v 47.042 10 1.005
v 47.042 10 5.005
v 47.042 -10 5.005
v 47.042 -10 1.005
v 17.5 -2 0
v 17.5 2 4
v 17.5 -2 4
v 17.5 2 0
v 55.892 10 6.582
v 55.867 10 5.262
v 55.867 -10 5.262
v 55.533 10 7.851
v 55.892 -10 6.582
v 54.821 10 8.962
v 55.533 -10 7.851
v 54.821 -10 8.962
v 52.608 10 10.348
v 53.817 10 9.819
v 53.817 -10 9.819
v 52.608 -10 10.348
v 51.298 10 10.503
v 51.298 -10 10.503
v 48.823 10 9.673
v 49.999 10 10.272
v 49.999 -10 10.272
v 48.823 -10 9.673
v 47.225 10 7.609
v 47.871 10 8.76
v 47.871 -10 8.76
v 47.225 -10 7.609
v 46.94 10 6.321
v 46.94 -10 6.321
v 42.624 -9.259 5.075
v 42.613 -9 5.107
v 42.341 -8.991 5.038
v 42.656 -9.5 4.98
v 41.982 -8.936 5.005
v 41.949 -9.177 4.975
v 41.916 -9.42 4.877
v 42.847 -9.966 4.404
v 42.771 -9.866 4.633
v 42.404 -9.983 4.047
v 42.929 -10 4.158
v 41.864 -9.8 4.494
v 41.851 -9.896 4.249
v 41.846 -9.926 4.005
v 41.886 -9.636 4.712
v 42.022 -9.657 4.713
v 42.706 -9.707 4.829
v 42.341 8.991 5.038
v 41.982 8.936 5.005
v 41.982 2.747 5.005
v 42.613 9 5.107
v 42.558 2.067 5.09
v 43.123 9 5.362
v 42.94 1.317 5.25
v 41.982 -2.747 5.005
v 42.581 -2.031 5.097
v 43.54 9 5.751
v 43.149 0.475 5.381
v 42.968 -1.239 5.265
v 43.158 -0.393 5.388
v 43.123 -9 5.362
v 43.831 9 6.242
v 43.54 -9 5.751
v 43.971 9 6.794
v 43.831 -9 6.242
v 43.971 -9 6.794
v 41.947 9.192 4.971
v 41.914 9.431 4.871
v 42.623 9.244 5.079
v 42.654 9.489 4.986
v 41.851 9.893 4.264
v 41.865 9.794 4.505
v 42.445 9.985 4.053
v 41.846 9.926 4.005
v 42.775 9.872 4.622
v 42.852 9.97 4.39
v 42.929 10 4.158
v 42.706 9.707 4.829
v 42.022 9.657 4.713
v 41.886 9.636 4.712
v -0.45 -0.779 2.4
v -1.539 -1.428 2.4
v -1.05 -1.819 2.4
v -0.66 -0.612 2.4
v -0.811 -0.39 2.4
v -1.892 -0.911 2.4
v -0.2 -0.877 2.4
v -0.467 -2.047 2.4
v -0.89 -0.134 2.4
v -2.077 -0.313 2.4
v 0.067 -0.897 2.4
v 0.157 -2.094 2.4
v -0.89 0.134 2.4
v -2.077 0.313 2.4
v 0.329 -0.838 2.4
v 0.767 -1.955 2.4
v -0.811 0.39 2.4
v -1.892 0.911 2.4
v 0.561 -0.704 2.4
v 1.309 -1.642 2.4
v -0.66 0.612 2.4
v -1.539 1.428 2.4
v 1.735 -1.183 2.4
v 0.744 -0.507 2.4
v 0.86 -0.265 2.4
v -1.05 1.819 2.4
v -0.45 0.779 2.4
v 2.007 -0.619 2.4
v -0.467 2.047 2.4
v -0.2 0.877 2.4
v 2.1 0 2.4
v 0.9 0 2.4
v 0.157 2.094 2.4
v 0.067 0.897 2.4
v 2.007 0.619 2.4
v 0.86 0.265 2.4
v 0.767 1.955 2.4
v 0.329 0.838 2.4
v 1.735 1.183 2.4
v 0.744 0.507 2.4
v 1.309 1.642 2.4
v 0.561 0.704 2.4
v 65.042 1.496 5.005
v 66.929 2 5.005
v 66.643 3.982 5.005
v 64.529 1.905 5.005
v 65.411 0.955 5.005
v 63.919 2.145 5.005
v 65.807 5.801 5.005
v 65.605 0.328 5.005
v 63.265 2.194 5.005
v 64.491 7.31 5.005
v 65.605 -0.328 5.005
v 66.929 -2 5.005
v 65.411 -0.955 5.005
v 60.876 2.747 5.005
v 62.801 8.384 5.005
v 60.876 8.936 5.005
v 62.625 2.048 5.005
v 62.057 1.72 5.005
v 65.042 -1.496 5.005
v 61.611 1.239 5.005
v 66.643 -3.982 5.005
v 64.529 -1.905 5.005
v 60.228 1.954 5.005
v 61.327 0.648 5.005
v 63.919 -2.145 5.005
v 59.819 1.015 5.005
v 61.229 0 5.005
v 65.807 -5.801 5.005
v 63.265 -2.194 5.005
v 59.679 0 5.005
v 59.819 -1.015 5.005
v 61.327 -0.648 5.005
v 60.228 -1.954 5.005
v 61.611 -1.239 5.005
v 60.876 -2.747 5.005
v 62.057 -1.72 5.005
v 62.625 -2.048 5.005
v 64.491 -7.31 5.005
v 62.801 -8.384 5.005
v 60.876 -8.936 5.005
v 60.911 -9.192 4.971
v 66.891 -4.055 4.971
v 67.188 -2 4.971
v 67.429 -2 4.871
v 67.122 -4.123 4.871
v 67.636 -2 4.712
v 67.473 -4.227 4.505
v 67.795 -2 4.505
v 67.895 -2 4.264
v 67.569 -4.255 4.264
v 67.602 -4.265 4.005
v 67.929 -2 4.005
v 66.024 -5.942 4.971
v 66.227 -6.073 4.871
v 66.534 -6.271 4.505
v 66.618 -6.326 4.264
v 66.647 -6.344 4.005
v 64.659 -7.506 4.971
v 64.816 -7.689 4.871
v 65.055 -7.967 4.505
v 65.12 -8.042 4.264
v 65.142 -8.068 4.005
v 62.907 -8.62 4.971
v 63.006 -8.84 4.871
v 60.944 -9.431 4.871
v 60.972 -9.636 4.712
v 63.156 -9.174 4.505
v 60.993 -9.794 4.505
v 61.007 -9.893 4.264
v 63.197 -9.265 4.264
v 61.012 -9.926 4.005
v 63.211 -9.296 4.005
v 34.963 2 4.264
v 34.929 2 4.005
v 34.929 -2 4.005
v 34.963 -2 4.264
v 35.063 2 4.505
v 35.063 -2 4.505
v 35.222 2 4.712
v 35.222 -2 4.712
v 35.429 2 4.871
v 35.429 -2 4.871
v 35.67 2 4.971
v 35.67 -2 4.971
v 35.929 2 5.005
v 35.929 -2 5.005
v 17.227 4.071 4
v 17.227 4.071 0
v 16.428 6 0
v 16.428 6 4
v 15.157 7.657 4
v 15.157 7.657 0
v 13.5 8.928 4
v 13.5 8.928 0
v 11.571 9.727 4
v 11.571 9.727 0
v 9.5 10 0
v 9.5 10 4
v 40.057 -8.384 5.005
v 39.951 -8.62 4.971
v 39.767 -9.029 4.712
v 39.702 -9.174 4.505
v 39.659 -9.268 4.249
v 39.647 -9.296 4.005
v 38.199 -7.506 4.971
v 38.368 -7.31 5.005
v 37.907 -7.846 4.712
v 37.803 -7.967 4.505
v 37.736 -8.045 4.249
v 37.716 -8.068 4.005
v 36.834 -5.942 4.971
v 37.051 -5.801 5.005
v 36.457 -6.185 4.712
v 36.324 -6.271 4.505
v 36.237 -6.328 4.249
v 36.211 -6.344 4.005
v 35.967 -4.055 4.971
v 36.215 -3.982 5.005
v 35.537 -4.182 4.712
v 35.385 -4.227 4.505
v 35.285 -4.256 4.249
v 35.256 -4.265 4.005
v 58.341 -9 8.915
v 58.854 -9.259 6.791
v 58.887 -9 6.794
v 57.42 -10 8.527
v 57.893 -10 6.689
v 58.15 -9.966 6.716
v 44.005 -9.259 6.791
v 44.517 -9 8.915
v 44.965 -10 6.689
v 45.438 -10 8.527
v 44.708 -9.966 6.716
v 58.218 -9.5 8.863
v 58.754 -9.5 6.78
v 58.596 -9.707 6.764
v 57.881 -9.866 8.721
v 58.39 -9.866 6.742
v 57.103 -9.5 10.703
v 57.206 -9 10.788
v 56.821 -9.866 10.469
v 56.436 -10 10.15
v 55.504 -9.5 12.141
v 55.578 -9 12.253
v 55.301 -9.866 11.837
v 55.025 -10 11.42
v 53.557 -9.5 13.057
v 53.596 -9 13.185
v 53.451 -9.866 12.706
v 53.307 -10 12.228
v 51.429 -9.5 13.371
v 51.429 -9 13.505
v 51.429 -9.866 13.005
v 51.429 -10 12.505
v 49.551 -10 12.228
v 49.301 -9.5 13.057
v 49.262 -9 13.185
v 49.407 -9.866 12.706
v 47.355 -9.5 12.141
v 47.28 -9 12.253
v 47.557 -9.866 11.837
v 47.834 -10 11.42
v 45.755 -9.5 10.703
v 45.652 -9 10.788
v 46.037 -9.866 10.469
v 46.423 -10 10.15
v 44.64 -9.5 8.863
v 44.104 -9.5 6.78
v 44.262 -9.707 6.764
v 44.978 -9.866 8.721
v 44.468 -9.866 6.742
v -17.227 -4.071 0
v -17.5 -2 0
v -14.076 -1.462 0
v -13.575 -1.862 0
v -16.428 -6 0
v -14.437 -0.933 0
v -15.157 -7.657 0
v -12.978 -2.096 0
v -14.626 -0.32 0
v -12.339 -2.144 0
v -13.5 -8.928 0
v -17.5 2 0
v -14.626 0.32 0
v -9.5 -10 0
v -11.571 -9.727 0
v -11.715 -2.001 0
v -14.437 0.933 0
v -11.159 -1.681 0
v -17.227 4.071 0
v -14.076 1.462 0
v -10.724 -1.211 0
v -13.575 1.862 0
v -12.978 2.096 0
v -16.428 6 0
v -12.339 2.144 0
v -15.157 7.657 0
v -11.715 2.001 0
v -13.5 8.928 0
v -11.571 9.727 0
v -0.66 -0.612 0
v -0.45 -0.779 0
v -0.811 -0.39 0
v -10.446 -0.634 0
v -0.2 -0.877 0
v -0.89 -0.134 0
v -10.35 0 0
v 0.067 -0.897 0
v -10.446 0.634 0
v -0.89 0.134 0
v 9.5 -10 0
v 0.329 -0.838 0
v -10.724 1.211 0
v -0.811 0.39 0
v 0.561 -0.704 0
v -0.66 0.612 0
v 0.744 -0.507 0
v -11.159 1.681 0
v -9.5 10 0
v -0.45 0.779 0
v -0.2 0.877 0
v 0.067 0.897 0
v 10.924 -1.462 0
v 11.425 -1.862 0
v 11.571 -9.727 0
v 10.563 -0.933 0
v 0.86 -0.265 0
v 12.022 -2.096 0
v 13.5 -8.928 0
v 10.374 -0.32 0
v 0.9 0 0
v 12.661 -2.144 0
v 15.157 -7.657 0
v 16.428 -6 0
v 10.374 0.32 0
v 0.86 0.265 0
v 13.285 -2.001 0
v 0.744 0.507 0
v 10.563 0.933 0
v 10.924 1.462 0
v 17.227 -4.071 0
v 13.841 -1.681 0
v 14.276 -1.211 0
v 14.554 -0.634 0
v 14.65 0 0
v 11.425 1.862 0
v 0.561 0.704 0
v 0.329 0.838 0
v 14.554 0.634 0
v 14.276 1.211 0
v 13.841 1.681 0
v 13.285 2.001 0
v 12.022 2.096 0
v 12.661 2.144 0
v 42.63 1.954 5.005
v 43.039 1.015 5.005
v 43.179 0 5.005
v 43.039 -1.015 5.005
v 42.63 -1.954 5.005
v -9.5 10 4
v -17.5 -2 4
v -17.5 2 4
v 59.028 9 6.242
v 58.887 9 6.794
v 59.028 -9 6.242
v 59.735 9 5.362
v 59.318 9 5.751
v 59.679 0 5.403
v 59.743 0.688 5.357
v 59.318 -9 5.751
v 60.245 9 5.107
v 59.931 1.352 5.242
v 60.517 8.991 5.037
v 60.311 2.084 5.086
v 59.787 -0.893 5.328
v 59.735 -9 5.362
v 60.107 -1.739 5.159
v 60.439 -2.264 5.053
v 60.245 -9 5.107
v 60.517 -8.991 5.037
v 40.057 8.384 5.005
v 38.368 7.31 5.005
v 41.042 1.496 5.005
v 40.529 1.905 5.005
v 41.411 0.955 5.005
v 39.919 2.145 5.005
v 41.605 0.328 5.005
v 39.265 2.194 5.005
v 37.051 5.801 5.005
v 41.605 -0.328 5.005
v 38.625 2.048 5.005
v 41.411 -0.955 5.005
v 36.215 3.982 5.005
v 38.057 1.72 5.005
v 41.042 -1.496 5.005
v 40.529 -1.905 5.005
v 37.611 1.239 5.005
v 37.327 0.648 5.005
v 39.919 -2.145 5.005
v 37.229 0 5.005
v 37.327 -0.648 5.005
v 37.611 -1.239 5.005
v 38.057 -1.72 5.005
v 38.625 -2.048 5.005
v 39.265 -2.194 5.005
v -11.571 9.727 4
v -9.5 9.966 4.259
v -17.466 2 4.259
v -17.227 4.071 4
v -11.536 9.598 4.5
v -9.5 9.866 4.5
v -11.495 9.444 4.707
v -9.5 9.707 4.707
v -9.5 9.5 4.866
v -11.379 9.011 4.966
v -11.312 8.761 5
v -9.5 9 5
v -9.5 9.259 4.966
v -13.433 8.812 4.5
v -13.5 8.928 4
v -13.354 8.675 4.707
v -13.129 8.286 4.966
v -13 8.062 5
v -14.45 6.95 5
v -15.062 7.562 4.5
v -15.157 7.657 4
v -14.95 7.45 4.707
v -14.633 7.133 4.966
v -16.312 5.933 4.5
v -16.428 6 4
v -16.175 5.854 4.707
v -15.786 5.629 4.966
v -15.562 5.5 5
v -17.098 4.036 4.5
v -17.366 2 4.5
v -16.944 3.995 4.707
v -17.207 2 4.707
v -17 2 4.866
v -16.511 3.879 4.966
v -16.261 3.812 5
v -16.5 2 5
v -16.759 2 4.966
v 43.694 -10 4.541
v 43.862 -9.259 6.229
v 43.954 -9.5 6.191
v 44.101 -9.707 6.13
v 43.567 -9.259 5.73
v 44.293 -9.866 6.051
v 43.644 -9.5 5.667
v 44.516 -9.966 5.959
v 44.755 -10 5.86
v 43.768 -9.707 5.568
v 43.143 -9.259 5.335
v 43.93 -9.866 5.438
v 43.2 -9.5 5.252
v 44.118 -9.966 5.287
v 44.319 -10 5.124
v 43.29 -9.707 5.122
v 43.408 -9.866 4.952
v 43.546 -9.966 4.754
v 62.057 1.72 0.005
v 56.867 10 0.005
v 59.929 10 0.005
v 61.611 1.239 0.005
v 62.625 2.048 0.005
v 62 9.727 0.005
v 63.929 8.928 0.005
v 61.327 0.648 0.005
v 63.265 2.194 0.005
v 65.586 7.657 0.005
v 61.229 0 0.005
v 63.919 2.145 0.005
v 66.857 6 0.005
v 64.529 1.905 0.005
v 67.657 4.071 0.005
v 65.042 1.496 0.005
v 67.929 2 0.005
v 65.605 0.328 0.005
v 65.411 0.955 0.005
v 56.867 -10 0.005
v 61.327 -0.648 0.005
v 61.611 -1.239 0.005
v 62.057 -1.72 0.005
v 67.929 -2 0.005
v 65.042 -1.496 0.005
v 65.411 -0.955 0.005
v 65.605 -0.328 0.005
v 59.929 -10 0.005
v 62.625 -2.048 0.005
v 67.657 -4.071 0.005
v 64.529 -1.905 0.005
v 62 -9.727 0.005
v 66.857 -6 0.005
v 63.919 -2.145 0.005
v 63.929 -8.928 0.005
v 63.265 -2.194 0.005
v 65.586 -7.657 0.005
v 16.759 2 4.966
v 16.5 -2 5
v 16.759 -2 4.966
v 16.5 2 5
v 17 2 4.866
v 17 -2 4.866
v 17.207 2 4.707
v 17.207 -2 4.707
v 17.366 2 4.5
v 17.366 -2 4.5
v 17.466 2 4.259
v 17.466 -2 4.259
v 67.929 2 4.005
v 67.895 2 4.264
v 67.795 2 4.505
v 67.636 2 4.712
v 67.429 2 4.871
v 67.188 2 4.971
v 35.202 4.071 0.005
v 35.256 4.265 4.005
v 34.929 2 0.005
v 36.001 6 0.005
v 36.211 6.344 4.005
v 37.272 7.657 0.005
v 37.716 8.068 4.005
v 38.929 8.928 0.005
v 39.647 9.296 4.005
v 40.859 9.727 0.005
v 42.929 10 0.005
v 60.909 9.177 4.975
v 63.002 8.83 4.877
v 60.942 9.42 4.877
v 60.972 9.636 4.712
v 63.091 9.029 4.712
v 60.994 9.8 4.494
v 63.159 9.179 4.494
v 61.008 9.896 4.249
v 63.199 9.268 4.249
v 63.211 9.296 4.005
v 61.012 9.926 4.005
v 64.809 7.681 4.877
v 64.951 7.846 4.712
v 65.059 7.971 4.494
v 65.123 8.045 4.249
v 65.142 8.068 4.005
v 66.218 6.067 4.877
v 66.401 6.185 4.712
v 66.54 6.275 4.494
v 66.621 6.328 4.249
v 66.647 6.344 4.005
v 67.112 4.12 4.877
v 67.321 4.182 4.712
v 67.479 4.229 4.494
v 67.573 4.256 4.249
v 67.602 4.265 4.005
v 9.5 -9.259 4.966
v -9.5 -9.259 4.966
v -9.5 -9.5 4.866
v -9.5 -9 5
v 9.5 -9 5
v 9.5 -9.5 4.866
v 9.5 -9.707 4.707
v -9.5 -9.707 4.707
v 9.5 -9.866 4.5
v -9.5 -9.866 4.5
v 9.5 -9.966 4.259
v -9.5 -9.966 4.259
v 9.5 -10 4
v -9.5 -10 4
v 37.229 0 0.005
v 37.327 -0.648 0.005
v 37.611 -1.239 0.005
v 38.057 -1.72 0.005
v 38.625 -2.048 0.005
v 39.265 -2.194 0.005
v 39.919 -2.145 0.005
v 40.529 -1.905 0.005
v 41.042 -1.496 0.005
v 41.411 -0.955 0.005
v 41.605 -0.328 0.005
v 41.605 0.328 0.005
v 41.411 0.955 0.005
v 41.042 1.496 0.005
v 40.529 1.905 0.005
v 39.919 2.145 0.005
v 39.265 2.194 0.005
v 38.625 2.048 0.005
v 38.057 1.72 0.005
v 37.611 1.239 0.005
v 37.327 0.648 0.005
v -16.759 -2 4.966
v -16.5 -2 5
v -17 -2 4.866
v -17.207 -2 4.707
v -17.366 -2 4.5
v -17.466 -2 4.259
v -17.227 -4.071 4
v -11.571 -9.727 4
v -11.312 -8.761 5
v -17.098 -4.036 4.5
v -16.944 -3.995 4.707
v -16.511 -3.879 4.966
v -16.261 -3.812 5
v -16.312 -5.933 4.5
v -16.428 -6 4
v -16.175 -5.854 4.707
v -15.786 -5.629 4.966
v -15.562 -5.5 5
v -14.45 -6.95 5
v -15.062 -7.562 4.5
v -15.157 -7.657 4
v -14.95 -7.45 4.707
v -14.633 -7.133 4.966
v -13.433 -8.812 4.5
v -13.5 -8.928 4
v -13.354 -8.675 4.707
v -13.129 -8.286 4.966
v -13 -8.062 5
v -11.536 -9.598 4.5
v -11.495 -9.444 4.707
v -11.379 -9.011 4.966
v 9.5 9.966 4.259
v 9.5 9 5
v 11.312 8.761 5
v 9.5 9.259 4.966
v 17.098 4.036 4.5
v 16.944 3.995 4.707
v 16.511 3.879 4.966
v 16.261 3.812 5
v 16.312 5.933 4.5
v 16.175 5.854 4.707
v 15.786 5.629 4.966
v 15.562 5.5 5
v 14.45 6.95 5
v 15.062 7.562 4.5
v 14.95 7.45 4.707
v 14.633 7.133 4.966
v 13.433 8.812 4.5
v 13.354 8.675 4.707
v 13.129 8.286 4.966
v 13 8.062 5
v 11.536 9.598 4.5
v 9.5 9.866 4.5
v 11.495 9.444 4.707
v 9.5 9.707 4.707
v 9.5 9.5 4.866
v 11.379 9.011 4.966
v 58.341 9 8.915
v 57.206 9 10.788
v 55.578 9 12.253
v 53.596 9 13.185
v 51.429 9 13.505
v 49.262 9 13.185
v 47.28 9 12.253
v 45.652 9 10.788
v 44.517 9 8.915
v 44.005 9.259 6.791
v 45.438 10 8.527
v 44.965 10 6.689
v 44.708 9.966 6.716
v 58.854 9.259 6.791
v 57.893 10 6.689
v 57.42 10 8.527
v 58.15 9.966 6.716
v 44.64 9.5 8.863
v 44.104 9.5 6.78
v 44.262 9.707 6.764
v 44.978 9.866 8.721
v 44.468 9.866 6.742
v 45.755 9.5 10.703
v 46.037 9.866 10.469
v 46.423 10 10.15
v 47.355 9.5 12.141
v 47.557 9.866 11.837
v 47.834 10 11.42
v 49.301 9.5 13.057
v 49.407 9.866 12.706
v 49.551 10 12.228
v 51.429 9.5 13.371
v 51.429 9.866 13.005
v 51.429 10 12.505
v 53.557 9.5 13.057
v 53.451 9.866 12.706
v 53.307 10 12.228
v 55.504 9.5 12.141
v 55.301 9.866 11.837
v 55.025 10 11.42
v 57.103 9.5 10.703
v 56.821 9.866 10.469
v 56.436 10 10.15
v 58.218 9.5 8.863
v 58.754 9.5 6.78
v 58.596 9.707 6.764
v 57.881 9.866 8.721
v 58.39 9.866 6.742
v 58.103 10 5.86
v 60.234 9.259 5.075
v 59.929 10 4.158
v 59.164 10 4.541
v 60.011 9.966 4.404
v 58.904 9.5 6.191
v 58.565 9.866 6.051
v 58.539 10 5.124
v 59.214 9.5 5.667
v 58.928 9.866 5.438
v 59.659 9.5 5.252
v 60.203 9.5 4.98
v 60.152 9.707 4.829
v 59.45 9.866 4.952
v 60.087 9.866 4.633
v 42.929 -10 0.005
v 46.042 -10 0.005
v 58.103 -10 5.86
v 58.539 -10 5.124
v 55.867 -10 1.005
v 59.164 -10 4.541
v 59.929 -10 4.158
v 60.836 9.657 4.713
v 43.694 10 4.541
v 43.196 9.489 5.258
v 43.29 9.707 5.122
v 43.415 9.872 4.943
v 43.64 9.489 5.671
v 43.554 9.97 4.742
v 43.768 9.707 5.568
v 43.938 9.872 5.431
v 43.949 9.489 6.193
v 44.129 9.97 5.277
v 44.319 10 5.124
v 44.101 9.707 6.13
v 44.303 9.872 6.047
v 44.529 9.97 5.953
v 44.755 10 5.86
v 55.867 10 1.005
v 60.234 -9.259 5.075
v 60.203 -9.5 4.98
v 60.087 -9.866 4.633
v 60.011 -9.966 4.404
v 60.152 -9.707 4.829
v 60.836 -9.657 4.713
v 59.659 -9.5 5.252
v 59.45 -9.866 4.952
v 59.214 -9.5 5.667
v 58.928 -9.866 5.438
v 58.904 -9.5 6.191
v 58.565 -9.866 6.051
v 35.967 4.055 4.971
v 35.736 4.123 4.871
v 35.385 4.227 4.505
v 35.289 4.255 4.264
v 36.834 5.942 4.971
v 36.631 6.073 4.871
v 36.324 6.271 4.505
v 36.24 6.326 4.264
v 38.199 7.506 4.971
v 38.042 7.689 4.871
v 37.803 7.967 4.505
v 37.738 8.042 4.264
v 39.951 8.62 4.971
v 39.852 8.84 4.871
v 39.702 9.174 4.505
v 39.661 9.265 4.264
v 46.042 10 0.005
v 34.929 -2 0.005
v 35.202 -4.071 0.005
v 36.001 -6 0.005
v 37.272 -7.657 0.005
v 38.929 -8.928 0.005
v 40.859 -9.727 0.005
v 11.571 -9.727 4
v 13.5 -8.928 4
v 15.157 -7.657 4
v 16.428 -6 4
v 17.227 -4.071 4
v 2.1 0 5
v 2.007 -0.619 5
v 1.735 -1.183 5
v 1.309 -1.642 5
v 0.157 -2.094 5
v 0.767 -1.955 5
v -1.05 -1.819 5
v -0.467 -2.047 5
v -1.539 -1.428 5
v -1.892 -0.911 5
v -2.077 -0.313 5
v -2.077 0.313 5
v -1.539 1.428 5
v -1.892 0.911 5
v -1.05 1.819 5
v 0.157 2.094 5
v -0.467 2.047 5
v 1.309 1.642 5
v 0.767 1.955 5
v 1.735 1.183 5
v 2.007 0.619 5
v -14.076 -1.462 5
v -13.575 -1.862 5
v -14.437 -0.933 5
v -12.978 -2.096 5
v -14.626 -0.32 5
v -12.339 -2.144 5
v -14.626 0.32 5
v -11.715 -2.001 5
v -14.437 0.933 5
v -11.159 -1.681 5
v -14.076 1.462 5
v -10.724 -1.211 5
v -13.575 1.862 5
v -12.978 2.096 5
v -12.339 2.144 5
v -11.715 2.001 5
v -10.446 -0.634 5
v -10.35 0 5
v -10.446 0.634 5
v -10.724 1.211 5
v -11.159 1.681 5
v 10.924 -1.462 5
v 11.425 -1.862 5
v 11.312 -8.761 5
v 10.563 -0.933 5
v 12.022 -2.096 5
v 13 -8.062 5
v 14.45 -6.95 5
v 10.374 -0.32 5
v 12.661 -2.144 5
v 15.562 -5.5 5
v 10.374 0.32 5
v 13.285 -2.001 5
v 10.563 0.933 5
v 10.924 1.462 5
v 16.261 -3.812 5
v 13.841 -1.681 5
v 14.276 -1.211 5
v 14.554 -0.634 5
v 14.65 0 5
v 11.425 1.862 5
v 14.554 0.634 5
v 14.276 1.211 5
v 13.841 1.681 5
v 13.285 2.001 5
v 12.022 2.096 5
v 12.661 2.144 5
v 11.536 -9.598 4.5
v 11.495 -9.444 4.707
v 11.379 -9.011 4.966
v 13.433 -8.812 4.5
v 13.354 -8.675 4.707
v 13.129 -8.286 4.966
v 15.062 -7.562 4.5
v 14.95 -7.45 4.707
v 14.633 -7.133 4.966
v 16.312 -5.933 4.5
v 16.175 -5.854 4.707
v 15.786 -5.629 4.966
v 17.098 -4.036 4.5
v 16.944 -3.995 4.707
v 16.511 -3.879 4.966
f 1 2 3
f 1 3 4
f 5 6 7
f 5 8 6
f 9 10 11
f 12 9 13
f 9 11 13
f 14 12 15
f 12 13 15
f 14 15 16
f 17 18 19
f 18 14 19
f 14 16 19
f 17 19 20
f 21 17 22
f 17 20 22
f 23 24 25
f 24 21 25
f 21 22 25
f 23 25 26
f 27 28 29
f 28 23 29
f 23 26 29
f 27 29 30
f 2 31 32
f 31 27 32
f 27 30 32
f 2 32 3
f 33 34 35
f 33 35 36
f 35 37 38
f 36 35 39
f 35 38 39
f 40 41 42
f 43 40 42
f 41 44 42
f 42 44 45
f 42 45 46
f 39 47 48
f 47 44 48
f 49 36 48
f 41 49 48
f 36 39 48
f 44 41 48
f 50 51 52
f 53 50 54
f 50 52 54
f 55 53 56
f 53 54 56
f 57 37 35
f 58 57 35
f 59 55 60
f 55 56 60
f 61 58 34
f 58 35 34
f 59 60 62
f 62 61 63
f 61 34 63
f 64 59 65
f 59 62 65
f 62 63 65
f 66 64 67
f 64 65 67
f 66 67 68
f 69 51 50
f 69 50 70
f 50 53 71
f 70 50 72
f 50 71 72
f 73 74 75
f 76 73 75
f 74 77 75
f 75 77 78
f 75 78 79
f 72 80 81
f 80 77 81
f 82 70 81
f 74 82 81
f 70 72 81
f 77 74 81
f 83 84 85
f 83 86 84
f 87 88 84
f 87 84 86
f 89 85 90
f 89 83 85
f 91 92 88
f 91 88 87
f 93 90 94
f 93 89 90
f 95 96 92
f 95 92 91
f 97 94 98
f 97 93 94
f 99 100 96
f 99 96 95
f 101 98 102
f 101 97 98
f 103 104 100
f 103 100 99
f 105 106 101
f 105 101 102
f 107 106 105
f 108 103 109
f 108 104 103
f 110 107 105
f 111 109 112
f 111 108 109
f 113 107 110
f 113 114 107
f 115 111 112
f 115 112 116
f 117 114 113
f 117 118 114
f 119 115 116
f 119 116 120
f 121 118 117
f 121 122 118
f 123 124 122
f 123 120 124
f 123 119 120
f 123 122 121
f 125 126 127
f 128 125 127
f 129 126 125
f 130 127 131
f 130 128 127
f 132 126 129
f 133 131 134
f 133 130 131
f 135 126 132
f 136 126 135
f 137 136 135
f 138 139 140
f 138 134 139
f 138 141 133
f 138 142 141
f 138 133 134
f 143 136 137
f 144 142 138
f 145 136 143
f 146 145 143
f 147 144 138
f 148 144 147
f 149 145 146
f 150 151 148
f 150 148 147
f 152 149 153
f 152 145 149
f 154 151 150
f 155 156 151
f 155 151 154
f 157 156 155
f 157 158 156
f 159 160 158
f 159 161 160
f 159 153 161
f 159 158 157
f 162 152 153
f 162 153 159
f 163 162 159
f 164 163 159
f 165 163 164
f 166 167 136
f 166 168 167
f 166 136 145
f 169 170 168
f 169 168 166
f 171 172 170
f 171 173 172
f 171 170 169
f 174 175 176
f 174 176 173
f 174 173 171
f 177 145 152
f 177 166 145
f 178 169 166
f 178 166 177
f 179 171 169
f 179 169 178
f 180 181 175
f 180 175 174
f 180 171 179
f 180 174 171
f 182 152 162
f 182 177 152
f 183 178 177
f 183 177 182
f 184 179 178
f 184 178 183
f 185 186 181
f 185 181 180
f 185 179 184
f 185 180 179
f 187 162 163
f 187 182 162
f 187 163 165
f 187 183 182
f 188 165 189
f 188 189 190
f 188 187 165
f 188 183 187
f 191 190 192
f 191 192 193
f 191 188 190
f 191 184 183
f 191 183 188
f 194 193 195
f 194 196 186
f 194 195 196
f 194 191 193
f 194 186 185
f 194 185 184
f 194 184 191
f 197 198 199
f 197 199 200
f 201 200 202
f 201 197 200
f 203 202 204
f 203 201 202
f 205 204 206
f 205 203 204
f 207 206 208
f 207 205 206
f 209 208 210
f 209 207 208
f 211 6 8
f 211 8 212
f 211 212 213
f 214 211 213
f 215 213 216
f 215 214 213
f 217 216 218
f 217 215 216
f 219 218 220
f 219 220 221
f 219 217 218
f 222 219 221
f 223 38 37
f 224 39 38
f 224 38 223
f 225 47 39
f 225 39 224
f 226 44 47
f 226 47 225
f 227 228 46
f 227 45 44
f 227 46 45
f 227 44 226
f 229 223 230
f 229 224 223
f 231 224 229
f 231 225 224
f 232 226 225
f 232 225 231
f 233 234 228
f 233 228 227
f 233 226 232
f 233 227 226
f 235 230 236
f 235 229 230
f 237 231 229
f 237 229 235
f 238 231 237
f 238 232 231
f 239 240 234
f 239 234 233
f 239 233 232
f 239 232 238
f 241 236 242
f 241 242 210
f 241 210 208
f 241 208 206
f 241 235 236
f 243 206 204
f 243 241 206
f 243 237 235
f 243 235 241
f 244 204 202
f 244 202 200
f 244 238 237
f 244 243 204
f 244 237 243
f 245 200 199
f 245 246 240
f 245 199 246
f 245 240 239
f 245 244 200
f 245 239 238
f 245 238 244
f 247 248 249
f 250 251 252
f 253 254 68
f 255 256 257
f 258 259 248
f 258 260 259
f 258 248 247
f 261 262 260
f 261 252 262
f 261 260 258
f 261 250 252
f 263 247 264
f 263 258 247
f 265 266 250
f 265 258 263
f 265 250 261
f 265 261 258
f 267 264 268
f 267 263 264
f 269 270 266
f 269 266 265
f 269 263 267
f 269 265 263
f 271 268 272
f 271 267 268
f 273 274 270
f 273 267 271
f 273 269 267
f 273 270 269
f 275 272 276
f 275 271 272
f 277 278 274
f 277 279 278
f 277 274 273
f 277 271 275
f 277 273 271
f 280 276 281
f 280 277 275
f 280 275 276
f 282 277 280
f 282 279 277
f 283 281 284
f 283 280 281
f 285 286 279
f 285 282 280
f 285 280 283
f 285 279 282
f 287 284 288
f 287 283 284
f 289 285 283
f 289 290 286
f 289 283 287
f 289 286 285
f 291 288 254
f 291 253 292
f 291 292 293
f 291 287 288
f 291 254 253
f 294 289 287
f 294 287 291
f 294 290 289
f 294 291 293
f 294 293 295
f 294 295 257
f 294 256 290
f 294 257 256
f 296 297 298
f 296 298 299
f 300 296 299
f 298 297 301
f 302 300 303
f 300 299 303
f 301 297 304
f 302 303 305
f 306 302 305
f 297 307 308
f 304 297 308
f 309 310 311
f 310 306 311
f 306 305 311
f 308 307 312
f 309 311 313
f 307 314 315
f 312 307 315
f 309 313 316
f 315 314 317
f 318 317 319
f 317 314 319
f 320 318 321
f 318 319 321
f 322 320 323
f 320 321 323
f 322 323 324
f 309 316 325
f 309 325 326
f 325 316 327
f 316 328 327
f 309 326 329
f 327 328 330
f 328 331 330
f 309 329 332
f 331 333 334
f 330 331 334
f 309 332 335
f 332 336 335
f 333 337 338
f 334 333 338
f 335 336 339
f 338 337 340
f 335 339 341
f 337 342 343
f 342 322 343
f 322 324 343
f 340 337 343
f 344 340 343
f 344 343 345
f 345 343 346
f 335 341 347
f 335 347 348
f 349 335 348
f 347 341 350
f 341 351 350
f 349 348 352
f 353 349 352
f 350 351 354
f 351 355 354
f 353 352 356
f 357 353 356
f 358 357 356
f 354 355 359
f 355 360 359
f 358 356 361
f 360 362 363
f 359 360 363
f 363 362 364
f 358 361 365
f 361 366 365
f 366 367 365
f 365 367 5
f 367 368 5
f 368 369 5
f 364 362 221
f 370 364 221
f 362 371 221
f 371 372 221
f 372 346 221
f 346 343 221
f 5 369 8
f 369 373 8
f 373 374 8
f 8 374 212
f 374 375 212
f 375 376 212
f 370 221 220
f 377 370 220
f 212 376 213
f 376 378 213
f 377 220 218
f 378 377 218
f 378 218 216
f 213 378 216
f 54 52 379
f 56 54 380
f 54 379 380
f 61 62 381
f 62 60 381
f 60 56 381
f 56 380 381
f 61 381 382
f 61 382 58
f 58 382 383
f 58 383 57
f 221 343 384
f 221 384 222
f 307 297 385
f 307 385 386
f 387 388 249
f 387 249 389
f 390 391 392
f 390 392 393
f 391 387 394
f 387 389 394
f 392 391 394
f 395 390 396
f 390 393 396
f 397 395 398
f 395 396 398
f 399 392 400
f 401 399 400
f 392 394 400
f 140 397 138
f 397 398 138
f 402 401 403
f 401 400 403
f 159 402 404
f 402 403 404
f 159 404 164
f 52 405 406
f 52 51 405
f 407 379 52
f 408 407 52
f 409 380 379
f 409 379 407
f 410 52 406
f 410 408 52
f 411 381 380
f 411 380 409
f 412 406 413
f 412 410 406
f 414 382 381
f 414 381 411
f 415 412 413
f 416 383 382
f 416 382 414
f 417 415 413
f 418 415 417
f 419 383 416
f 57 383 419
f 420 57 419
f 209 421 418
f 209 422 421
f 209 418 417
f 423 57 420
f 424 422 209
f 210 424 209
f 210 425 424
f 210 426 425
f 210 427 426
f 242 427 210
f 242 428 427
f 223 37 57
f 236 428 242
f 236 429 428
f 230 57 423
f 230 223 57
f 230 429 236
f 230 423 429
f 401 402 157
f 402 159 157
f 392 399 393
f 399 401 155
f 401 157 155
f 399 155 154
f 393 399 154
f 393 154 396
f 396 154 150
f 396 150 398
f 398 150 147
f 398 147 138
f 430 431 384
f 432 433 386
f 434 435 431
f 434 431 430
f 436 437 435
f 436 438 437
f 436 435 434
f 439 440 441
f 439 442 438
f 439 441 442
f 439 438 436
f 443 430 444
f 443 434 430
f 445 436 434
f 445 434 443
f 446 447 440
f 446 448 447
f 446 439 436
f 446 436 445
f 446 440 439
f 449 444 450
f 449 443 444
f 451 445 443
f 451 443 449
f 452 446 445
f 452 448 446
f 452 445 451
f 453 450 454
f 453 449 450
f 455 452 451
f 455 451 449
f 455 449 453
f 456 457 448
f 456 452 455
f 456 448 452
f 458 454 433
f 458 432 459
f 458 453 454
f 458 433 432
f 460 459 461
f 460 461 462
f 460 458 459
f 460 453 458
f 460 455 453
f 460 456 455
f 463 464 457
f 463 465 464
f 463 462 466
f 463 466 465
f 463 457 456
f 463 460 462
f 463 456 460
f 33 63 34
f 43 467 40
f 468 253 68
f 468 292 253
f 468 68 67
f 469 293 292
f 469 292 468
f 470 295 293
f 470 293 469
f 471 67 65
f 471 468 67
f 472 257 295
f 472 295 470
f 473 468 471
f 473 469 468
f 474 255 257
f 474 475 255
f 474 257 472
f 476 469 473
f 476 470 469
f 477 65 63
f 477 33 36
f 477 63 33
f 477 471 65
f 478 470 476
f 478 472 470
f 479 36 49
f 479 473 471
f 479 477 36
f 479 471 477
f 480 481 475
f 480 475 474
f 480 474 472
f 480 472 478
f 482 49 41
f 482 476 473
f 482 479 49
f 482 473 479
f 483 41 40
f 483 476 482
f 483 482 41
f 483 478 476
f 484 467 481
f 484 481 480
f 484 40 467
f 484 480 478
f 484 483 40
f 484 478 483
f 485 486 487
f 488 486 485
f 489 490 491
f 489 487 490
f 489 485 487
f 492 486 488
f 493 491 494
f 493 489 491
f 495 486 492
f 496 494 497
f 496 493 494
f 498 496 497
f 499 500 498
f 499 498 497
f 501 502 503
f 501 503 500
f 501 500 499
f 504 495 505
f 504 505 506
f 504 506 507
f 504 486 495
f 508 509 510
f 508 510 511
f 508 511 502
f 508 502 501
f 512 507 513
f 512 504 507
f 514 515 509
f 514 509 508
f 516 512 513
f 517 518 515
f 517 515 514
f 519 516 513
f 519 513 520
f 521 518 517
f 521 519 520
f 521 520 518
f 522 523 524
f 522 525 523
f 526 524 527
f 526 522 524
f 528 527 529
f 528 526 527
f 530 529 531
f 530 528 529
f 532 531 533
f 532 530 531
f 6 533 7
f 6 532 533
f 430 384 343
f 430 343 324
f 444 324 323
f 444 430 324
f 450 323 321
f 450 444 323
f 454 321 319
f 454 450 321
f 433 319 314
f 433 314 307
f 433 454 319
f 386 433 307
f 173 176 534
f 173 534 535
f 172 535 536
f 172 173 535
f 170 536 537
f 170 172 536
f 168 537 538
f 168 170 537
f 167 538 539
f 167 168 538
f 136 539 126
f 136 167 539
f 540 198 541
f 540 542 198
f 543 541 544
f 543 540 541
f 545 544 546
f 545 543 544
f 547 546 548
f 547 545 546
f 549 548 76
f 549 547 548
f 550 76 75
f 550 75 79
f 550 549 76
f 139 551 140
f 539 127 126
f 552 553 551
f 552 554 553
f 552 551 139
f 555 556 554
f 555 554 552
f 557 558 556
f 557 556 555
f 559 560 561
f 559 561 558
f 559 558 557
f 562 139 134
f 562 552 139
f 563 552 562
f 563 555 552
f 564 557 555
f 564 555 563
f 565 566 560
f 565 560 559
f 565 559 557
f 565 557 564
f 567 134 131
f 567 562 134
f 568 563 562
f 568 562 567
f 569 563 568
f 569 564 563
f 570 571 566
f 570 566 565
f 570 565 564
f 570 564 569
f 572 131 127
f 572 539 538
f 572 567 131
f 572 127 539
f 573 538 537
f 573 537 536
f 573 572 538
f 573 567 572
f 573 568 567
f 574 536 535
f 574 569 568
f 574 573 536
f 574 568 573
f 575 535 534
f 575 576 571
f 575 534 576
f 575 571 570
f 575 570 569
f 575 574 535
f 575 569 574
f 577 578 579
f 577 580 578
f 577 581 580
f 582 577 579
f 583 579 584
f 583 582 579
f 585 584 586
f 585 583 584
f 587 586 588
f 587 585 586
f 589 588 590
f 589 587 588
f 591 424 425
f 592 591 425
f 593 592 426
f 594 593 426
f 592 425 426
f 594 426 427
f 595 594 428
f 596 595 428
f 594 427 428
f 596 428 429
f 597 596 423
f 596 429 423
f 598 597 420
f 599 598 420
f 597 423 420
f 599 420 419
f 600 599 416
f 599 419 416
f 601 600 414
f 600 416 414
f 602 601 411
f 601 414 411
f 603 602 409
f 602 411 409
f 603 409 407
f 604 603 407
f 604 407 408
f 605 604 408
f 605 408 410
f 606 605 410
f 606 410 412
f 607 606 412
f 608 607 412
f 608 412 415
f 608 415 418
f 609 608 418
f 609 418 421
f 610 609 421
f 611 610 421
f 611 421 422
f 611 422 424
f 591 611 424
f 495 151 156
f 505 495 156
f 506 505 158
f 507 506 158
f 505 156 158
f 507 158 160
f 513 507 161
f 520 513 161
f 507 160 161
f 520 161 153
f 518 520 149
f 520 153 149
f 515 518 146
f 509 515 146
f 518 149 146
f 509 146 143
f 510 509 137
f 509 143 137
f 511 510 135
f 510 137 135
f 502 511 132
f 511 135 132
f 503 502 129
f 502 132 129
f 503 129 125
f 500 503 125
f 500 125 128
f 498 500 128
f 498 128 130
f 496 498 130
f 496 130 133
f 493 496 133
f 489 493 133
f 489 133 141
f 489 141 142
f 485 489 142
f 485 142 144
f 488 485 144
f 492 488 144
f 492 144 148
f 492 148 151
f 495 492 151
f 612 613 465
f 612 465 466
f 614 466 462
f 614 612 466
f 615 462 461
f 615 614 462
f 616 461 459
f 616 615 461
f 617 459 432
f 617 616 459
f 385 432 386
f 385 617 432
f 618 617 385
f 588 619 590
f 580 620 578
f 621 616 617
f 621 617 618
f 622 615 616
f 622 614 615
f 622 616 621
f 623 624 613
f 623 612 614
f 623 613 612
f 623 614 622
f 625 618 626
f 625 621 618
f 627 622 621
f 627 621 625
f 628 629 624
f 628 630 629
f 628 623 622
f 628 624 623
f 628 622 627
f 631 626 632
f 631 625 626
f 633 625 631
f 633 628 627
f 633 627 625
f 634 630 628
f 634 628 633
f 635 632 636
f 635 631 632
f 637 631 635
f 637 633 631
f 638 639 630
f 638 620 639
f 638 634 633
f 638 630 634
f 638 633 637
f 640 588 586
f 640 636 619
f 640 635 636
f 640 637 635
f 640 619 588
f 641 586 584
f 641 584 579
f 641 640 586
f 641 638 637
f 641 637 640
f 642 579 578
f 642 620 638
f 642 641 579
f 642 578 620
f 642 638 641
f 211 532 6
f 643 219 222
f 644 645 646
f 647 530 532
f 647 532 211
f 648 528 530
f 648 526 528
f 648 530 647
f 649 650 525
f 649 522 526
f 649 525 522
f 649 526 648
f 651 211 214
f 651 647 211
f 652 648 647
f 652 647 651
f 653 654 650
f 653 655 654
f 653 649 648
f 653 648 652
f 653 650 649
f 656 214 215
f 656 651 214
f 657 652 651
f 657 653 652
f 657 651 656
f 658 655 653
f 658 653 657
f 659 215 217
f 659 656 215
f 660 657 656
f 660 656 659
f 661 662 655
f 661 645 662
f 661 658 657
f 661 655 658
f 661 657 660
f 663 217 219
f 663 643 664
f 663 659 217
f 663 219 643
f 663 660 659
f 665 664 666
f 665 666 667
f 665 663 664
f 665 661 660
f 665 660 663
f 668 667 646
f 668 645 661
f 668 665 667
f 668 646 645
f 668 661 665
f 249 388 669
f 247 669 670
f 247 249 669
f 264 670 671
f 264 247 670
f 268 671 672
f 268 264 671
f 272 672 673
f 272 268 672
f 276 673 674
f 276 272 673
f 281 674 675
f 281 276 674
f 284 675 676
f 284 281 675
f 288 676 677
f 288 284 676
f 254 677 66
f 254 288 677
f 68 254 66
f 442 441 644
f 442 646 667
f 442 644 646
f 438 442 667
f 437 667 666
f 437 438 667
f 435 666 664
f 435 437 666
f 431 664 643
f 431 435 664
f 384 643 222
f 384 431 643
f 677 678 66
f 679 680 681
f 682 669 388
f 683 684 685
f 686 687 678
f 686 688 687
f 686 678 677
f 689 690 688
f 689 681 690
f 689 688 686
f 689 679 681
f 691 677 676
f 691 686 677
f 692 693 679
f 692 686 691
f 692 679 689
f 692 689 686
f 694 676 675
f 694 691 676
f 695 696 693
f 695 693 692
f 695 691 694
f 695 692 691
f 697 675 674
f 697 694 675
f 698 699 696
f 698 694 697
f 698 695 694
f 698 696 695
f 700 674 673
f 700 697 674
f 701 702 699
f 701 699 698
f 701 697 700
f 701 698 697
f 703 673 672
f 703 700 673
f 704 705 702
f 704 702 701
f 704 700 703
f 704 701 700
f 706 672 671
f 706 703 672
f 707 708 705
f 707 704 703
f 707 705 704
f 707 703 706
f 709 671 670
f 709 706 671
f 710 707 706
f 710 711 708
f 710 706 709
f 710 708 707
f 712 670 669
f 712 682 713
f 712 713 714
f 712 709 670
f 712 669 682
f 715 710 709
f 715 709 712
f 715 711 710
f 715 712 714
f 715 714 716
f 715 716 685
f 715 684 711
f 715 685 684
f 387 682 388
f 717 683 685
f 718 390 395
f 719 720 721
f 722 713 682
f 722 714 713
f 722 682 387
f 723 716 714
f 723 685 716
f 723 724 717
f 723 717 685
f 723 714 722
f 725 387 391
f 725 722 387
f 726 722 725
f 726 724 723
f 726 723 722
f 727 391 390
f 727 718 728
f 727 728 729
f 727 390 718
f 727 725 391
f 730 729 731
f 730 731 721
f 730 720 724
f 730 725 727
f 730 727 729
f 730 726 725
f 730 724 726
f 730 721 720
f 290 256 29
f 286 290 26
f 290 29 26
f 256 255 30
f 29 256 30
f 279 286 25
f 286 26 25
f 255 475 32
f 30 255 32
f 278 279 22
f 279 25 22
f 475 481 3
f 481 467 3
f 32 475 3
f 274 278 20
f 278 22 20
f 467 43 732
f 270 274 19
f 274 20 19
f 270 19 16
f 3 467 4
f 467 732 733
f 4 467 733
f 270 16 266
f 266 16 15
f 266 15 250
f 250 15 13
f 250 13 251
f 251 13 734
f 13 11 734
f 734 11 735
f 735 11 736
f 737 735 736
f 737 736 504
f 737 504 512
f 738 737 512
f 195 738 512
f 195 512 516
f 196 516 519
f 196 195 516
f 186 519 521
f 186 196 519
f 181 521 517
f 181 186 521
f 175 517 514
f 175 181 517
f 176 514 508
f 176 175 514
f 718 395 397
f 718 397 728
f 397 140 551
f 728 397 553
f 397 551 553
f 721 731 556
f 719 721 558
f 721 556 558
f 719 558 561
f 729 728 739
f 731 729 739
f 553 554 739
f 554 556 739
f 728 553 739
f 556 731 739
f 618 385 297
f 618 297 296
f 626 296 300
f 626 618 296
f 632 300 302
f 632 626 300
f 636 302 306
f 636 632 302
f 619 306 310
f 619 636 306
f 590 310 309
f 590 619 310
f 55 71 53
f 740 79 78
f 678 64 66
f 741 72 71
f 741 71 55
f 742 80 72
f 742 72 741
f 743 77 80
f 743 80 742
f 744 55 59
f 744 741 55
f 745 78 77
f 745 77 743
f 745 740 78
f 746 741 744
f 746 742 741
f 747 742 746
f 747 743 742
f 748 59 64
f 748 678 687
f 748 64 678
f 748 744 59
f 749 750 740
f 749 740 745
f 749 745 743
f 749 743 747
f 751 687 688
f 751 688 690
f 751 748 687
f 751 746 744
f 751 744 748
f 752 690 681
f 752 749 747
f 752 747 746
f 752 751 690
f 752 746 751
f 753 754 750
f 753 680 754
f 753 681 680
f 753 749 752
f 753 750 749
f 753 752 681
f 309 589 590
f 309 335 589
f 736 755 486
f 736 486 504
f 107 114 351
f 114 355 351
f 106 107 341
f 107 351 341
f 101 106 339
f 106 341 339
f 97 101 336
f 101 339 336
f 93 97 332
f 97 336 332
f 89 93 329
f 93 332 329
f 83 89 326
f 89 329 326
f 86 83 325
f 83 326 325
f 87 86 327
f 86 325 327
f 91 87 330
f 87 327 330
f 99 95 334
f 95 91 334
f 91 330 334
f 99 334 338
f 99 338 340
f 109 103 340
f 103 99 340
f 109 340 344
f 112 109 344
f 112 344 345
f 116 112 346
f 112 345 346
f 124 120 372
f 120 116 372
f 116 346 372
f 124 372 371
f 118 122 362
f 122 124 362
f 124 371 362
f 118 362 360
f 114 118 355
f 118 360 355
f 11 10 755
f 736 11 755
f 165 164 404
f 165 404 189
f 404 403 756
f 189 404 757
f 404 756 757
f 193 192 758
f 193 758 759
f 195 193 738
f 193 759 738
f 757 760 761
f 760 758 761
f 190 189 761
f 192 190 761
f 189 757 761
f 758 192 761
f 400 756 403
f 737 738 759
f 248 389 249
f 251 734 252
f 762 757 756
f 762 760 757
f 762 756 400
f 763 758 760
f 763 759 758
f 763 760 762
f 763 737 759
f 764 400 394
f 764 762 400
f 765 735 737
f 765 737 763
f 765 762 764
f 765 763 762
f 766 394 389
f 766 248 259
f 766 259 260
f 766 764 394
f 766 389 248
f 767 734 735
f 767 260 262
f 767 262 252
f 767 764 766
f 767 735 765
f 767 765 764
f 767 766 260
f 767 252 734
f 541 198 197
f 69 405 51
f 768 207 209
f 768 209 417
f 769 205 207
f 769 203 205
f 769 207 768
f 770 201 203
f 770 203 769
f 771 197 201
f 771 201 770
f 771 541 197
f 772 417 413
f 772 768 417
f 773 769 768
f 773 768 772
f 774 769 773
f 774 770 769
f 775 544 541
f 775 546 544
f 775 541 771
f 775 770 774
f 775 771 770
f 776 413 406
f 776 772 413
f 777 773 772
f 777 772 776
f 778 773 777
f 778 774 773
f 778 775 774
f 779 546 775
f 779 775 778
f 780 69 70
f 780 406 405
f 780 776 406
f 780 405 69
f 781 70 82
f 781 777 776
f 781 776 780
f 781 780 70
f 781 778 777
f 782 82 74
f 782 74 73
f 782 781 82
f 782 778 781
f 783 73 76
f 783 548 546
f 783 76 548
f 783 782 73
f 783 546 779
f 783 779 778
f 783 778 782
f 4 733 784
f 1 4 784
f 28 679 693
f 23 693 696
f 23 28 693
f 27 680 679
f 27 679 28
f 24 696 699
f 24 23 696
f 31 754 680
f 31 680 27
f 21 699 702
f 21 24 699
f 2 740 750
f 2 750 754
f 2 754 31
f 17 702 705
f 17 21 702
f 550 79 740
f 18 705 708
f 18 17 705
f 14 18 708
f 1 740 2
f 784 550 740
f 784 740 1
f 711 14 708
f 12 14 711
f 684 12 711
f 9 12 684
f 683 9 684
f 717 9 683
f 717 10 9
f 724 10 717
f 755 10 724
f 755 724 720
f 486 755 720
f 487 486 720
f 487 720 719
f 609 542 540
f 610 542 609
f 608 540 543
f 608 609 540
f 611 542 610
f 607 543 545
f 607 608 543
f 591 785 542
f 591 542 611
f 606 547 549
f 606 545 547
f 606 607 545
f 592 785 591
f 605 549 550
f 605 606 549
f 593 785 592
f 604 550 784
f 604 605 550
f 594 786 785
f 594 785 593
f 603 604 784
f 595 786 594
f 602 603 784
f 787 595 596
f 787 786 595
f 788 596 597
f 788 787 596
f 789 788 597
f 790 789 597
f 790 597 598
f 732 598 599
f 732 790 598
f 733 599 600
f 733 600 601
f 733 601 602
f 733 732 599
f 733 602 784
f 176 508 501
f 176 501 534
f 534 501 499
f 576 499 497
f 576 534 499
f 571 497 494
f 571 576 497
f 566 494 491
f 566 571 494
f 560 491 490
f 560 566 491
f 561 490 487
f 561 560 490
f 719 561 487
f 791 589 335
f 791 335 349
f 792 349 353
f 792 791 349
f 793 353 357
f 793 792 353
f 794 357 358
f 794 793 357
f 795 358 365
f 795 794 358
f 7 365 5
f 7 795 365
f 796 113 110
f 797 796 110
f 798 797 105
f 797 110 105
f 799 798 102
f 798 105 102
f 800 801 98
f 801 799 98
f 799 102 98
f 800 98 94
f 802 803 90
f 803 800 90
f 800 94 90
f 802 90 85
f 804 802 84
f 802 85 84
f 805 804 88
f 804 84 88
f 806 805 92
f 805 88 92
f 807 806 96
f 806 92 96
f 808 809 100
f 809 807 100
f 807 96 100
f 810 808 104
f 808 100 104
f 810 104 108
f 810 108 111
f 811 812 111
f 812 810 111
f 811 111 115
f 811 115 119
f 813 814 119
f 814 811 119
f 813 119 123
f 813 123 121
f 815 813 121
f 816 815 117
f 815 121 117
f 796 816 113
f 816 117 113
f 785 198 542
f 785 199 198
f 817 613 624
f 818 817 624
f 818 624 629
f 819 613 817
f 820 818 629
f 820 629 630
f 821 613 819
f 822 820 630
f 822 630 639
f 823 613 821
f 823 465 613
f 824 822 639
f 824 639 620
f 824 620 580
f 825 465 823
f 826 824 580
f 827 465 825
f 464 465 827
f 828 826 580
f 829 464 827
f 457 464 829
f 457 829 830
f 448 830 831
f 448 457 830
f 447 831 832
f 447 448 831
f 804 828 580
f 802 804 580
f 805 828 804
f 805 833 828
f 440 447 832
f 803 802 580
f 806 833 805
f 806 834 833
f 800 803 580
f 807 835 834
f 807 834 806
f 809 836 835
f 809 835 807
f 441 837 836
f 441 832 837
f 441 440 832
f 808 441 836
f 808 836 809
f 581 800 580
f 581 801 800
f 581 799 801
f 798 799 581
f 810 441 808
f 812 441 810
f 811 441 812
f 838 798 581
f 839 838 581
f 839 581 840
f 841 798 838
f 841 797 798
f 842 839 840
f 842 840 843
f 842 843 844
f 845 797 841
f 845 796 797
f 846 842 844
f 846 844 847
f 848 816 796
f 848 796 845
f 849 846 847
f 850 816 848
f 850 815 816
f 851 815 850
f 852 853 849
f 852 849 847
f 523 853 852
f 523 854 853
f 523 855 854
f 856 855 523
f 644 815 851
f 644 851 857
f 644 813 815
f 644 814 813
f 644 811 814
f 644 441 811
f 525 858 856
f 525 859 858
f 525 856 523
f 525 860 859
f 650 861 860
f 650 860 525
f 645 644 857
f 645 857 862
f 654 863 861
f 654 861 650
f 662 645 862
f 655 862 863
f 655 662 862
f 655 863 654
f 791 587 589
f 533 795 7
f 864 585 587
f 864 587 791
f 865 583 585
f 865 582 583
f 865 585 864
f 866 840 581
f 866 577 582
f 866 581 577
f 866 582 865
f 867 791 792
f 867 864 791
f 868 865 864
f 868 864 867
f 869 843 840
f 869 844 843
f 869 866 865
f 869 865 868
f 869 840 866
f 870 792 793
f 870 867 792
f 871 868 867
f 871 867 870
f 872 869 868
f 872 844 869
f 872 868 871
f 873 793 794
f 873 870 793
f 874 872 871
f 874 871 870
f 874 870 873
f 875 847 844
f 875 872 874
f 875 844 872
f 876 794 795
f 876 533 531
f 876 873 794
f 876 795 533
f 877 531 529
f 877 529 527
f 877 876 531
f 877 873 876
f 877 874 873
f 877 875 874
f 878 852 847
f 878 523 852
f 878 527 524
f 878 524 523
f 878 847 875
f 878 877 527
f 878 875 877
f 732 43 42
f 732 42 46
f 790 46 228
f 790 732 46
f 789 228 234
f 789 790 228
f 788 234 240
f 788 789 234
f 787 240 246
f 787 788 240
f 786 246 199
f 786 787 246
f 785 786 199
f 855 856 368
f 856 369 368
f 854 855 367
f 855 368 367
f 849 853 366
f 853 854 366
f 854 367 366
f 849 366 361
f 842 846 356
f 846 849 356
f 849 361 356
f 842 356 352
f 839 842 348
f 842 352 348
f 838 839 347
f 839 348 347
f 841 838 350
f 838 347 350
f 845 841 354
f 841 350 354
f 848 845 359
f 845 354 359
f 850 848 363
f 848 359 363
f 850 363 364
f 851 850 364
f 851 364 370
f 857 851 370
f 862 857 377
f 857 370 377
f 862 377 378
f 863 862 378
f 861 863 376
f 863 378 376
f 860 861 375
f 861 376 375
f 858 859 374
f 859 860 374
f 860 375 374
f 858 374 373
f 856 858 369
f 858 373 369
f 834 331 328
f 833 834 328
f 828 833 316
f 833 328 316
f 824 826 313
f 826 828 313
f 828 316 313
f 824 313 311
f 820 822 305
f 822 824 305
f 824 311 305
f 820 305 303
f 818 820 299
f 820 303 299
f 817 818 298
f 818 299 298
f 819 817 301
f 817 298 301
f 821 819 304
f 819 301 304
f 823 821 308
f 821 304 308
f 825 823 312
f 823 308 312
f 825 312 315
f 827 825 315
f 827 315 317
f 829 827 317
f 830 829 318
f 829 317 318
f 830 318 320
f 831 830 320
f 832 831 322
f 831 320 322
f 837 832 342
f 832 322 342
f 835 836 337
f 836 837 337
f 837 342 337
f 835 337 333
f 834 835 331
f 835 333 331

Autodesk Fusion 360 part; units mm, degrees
sketch "Sketch1" plane through (0, 0, 0) normal (0, 0, 1) x (1, 0, 0)
  circle A0 centre (0, 0) radius 2.1
  line L0 (17.5, -10) -> (-17.5, -10)
  line L1 (-17.5, -10) -> (-17.5, 10)
  line L2 (-17.5, 10) -> (17.5, 10)
  line L3 (17.5, 10) -> (17.5, -10)
  line L4 (17.5, -10) -> (-17.5, 10) construction
  line L5 (-17.5, -10) -> (17.5, 10) construction
  circle A1 centre (-12.5, 0) radius 2.15
  circle A2 centre (12.5, 0) radius 2.15
  circle A3 centre (0, 0) radius 0.9
  circle A4 centre (-12.5, 0) radius 3.75
  dimension "d1" = 4.2
  dimension "d2" = 35
  dimension "d3" = 20
  dimension "d4" = 4.3
  dimension "d5" = 4.3
  dimension "d6" = 5
  dimension "d7" = 5
  dimension "d8" = 1.8
  dimension "d17" = 7.5
extrude "Extrude1" add sketch "Sketch1" along normal blind 5 contours L0 L1 L2 L3 | A4 makes body 1
extrude "Extrude2" add sketch "Sketch1" along normal blind 2.4 contours A0 bodies 1
fillet "Fillet1" radius 8 4 edges at (-17.5, 10, 2.5) (-17.5, -10, 2.5) (17.5, 10, 2.5) (17.5, -10, 2.5) on bodies 1
fillet "Fillet2" radius 1 8 edges at (15.1569, -7.6569, 5) (0, -10, 5) (-15.1569, -7.6569, 5) (-17.5, 0, 5) (-15.1569, 7.6569, 5) (0, 10, 5) (15.1569, 7.6569, 5) (17.5, 0, 5) on bodies 1
sketch "Sketch2" plane through (0, 0, 0) normal (0, 1, 0) x (1, 0, 0)
  line L0 (67.9291, -0.0049) -> (67.9291, -5.0049)
  line L1 (34.9291, -5.0049) -> (34.9291, -0.0049)
  arc A0 (43.996, -5.0049) -> (58.8621, -5.0049) centre (51.4291, -6.0049) ccw
  arc A1 (47.0416, -5.0049) -> (55.8674, -5.2624) centre (51.4291, -6.0049) ccw
  line L2 (67.9291, -5.0049) -> (58.8621, -5.0049)
  line L3 (43.996, -5.0049) -> (34.9291, -5.0049)
  line L4 (47.0416, -5.0049) -> (47.0416, -0.0049)
  line L5 (55.8674, -5.2624) -> (55.8674, -0.0049)
  line L6 (34.9291, -0.0049) -> (47.0416, -0.0049)
  line L7 (55.8674, -0.0049) -> (67.9291, -0.0049)
  dimension "d18" = 33
  dimension "d19" = 5
  dimension "d20" = 9
  dimension "d21" = 1
  dimension "d22" = 15
extrude "Extrude3" add sketch "Sketch2" along normal mid plane 20 separate body makes body 2
sketch "Sketch3" plane through (0, 0, 5.0049) normal (0, 0, 1) x (-1, 0, 0)
  line L0 (-43.996, 10) -> (-43.996, -10)
  line L1 (-43.996, -10) -> (-34.9291, -10)
  line L2 (-34.9291, -10) -> (-34.9291, 10)
  line L3 (-34.9291, 10) -> (-43.996, 10)
  line L4 (-67.9291, 10) -> (-67.9291, -10)
  line L5 (-67.9291, -10) -> (-58.8621, -10)
  line L6 (-58.8621, -10) -> (-58.8621, 10)
  line L7 (-58.8621, 10) -> (-67.9291, 10)
  circle A0 centre (-39.4291, 0) radius 2.2
  circle A1 centre (-63.4291, 0) radius 2.2
  circle A2 centre (-63.4291, 0) radius 3.75
  circle A3 centre (-39.4291, 0) radius 3.75
  dimension "d25" = 4.4
  dimension "d26" = 4.4
  dimension "d27" = 4.5
  dimension "d28" = 4.5
  dimension "d37" = 7.5
  dimension "d38" = 7.5
extrude "Extrude4" cut sketch "Sketch3" against normal blind 15.241 contours A0 | A1 bodies 2
fillet "Fillet3" radius 8 4 edges at (67.9291, -10, 2.5049) (34.9291, -10, 2.5049) (34.9291, 10, 2.5049) (67.9291, 10, 2.5049) on bodies 2
fillet "Fillet4" radius 2 2 edges at (43.996, 0, 5.0049) (58.8621, 0, 5.0049) on bodies 2
fillet "Fillet5" radius 1 16 edges at (60.3951, -9.9862, 5.0642) (59.216, -10, 5.8898) (51.4291, -10, 13.5049) (43.6421, -10, 5.8898) (42.463, -9.9862, 5.0642) (36.9467, -7.3114, 5.0049) (34.9291, 0, 5.0049) (36.9467, 7.3114, 5.0049) (42.463, 9.9862, 5.0642) (43.6421, 10, 5.8898) (51.4291, 10, 13.5049) (59.216, 10, 5.8898) (60.3951, 9.9862, 5.0642) (65.9114, 7.3114, 5.0049) (67.9291, 0, 5.0049) (65.9114, -7.3114, 5.0049) on bodies 2
extrude "Extrude5" cut sketch "Sketch3" along normal blind 7.844 contours A2 | A3 bodies 2
chamfer "Chamfer1" distance 1 distance2 1 2 edges at (47.0416, 0, 0.0049) (55.8674, 0, 0.0049) measured on face at (47.0416, -3.3333, 3.3382) measured on face at (57.6546, 0, 0.0049) on bodies 2
equation "d28 = d27"
